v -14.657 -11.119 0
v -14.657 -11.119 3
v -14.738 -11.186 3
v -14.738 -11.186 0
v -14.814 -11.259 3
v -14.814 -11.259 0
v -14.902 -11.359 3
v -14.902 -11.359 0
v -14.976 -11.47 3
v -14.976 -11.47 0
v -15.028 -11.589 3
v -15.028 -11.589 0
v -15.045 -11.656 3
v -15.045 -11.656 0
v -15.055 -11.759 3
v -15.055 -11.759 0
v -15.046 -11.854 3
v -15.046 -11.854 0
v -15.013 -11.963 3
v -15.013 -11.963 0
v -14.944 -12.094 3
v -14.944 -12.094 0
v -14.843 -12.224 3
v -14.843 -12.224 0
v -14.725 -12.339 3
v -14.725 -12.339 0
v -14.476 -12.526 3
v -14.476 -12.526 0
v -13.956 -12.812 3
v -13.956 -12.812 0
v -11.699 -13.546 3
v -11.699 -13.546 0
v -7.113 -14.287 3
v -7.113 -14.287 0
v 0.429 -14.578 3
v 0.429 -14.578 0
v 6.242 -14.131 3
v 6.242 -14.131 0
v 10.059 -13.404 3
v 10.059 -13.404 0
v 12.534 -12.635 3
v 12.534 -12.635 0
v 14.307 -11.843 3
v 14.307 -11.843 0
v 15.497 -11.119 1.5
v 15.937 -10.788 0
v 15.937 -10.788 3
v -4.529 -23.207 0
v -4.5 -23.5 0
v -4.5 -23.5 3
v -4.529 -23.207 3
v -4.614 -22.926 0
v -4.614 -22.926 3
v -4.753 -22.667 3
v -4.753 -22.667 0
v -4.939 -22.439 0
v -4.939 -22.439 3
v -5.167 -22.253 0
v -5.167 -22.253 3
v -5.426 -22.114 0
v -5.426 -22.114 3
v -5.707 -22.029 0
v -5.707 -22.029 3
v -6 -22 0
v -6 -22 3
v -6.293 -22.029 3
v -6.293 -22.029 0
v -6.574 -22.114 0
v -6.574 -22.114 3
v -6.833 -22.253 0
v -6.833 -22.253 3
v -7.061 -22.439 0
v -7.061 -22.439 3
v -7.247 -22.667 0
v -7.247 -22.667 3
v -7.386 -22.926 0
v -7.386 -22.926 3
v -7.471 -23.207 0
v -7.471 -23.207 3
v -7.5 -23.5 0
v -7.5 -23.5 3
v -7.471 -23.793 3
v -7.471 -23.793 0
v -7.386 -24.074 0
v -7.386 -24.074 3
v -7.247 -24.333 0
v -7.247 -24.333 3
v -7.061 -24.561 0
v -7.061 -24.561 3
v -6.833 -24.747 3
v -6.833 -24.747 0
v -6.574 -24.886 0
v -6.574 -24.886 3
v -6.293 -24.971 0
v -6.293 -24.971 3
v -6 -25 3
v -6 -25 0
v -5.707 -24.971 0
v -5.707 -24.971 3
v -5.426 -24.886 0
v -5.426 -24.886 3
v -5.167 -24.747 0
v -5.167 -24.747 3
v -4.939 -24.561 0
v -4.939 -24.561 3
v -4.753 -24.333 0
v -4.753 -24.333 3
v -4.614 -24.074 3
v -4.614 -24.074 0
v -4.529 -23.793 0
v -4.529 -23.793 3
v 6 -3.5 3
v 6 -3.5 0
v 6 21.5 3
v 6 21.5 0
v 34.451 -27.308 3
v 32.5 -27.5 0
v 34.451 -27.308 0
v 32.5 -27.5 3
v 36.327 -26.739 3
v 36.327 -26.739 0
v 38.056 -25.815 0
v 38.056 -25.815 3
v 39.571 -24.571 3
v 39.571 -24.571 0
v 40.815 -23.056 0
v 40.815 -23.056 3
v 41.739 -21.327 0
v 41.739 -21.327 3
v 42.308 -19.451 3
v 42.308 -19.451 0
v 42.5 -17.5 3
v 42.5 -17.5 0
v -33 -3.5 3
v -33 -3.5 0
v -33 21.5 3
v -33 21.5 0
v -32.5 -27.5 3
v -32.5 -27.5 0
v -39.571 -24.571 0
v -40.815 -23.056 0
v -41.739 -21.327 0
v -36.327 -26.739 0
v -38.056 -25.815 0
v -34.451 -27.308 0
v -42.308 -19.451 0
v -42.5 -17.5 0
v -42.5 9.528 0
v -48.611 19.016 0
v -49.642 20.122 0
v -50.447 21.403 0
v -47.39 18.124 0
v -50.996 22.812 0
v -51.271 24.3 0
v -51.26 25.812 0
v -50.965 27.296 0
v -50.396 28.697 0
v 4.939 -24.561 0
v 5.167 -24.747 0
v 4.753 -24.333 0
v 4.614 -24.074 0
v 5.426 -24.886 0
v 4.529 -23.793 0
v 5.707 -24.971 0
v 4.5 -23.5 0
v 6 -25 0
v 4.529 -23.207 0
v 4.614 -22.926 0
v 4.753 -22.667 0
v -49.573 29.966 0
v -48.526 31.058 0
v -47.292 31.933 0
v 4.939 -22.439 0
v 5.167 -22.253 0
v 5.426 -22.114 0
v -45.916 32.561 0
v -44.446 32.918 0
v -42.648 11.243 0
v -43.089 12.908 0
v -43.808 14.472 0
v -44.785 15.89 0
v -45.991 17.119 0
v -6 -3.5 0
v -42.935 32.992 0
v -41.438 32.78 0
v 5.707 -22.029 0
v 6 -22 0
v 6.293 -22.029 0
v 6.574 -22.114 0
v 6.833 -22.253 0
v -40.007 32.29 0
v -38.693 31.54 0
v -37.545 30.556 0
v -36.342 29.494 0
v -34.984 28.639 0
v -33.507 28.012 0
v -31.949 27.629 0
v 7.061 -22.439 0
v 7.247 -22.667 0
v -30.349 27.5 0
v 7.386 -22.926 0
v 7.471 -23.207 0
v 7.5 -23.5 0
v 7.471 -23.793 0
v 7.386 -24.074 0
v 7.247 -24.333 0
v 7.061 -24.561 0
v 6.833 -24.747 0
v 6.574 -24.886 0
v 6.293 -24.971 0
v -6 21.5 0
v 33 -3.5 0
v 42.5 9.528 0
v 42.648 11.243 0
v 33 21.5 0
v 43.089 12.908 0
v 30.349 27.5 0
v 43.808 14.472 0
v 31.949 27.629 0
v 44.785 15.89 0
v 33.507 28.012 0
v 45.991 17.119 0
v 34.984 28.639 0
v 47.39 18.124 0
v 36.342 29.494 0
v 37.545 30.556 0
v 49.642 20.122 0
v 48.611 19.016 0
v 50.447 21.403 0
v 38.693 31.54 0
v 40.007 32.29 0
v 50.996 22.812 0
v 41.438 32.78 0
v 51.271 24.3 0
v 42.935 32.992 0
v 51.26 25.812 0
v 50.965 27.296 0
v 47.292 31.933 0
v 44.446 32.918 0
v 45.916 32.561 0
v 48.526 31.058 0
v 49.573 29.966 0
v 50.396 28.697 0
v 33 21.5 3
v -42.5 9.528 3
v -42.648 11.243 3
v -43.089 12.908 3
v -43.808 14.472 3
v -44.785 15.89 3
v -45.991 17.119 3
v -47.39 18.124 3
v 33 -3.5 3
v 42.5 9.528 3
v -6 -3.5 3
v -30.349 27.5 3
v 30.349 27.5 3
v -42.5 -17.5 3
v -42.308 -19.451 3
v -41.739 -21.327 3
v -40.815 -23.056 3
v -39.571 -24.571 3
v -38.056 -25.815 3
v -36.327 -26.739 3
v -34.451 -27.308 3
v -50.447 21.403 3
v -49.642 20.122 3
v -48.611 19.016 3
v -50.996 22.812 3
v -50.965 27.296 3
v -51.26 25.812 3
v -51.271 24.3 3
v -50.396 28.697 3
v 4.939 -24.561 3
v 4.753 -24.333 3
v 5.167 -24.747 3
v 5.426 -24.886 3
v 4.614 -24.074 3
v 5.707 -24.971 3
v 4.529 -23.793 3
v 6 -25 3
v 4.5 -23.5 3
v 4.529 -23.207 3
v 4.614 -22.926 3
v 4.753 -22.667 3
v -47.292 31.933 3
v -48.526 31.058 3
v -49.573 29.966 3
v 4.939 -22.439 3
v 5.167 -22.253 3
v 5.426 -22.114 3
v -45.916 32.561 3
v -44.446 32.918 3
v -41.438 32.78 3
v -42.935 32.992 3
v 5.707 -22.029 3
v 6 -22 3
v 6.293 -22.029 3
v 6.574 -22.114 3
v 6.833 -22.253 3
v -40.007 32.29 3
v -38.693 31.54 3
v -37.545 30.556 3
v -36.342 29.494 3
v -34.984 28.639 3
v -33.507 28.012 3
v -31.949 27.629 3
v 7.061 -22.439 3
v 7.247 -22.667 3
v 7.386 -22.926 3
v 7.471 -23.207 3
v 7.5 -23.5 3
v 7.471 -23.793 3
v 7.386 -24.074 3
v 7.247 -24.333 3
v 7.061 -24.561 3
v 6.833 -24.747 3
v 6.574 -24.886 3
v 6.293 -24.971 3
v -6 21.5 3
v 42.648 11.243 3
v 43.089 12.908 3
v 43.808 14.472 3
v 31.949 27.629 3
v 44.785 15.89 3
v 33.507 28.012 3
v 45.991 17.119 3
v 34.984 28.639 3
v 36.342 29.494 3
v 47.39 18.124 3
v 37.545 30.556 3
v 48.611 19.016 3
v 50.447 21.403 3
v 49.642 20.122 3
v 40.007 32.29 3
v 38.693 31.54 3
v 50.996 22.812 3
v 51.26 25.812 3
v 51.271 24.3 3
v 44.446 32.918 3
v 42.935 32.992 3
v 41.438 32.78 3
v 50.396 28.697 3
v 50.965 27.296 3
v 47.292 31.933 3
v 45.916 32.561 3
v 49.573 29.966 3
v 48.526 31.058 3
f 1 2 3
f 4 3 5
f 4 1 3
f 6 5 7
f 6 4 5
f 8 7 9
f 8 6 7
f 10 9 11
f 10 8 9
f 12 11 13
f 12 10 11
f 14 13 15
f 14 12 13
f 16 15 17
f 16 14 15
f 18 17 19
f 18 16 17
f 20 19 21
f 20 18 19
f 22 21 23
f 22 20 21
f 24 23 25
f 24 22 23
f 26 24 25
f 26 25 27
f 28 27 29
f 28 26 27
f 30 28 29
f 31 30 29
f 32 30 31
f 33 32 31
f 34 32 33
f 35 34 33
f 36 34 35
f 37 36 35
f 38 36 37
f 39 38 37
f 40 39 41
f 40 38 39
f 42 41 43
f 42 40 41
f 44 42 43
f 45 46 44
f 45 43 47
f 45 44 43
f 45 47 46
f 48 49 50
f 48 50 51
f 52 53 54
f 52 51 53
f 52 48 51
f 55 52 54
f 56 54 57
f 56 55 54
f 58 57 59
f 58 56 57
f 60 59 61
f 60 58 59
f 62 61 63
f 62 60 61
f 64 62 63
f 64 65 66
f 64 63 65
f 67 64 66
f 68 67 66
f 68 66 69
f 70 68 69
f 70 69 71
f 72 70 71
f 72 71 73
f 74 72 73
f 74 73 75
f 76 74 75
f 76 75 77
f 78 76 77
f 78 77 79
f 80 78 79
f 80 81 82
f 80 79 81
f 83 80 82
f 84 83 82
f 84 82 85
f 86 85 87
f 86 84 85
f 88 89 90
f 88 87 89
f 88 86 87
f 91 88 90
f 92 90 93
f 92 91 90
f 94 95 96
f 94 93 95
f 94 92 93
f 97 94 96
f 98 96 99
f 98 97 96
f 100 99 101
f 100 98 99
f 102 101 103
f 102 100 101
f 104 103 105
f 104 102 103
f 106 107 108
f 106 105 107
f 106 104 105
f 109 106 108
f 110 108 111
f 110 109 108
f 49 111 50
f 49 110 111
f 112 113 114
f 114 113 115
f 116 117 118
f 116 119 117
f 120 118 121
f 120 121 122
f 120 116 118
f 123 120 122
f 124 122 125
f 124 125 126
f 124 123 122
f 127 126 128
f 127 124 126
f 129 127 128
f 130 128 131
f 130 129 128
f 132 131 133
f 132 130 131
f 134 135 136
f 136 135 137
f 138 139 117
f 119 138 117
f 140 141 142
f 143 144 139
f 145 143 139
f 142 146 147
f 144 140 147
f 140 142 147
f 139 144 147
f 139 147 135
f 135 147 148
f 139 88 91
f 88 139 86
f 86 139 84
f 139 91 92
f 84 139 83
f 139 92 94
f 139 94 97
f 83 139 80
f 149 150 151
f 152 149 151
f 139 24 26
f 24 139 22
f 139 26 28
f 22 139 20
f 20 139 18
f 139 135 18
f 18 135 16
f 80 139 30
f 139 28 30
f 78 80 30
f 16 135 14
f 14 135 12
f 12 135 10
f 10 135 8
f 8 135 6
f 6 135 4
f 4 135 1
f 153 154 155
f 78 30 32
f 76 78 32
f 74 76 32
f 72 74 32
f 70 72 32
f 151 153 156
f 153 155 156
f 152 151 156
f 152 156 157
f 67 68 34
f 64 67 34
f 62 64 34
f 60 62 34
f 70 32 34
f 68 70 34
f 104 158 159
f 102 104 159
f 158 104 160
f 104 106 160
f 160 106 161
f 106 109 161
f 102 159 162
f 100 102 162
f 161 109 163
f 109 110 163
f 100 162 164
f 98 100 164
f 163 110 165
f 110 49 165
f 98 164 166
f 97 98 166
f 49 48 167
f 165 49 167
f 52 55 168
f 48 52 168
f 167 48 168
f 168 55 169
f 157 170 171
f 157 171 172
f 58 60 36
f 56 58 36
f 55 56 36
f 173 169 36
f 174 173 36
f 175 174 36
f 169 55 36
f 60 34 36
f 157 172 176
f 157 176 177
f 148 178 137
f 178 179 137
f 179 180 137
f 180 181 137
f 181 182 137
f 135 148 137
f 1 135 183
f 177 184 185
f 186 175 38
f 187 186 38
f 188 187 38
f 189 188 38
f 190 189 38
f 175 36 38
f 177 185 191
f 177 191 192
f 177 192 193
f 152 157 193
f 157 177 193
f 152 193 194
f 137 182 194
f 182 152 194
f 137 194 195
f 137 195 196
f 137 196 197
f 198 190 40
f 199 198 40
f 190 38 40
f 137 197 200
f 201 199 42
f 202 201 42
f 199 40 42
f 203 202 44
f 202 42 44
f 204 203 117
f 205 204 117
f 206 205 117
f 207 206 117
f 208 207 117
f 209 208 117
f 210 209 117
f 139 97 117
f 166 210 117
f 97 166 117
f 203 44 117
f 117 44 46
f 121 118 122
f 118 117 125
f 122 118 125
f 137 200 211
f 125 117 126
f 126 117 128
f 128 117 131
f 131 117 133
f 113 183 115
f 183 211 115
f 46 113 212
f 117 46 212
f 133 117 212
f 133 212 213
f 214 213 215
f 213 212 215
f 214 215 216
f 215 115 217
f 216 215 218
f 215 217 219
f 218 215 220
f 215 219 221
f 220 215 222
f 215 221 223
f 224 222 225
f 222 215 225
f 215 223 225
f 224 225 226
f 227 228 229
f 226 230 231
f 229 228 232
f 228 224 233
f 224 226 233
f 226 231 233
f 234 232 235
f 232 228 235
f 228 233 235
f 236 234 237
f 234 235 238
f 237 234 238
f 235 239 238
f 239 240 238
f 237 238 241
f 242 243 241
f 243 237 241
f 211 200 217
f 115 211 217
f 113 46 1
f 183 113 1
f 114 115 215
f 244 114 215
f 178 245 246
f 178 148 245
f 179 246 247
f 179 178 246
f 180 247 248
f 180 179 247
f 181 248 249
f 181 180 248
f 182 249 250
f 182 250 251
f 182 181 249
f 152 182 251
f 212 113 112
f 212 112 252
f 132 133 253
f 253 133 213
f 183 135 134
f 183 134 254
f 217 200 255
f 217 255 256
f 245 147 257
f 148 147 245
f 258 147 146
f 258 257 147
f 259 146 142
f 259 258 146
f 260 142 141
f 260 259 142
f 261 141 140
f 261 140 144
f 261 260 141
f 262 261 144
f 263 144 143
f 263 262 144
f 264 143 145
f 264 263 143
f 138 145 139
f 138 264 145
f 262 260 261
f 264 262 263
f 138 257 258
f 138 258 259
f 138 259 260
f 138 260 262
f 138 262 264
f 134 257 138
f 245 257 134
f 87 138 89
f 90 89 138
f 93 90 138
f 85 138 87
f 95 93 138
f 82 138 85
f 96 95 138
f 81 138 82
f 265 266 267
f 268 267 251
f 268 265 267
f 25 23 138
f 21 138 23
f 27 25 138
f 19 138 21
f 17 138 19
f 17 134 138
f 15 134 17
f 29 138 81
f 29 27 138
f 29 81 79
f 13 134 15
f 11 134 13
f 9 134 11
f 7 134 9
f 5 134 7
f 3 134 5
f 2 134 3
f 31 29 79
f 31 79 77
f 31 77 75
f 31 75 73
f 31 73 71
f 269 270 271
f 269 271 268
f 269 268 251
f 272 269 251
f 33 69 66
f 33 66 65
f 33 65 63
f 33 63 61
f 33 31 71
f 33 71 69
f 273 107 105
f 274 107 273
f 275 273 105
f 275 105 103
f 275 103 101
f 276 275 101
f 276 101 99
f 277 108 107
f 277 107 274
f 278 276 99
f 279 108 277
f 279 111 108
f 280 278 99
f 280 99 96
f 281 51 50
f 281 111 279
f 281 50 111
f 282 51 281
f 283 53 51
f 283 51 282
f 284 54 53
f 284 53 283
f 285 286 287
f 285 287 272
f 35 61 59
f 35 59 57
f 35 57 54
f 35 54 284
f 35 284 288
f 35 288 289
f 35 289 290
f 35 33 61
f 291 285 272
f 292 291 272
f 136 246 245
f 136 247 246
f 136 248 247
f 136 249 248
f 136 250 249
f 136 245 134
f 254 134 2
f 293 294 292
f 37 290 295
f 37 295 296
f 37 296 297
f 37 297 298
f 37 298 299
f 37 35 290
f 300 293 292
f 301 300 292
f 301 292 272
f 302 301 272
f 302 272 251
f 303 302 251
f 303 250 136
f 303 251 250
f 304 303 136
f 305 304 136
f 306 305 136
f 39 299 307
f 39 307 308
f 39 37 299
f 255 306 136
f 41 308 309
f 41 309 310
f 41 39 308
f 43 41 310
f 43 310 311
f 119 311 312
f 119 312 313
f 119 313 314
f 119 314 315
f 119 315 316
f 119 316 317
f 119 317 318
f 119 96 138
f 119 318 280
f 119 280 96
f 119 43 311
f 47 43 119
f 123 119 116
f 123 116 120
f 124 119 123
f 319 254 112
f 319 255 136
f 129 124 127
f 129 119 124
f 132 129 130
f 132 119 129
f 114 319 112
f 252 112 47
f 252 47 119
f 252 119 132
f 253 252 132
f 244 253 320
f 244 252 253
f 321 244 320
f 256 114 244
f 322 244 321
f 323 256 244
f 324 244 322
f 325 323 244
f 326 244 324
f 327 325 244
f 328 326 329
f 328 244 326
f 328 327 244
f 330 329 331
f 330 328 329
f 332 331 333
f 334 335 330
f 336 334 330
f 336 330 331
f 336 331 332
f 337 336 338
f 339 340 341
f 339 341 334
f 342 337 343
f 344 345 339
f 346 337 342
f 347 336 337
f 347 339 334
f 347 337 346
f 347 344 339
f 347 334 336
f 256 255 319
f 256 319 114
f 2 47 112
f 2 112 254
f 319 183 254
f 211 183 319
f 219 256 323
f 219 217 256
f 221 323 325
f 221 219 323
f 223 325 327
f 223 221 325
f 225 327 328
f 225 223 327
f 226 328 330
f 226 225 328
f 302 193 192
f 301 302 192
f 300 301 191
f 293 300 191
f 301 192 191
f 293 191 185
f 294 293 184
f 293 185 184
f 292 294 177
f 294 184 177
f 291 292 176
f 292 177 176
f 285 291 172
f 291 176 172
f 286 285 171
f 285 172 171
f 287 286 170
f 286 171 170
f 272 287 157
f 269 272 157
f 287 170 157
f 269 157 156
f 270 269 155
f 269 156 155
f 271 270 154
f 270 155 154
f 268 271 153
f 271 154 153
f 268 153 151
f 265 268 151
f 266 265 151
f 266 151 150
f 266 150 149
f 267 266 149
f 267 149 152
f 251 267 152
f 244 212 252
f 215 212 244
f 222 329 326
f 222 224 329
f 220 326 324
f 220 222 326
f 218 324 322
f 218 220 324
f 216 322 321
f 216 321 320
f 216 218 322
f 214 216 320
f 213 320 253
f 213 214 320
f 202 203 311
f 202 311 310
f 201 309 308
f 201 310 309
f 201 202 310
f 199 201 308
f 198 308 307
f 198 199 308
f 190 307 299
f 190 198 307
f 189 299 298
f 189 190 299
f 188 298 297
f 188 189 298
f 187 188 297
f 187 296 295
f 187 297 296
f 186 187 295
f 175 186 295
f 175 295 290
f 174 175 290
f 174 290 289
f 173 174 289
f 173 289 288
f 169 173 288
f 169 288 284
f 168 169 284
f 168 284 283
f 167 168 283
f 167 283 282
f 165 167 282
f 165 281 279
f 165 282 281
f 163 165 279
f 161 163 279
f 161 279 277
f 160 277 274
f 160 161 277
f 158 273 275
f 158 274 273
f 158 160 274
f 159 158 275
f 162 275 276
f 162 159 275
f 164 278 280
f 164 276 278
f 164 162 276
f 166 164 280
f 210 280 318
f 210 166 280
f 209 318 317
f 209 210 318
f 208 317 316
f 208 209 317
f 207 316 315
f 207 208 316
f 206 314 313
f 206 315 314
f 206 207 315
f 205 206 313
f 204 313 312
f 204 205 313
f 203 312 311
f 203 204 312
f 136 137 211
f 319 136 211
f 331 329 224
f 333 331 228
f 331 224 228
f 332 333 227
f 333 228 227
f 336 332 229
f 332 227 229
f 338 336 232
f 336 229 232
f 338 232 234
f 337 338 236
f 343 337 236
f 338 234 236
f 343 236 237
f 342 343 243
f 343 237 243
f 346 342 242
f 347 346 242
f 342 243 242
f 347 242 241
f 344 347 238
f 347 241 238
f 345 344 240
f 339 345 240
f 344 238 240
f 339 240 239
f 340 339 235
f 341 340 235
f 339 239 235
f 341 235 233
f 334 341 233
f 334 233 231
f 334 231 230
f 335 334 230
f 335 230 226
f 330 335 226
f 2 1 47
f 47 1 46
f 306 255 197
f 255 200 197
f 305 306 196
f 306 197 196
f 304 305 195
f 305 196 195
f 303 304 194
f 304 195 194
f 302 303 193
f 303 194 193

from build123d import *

# Parameters (mm, degrees)
SKETCH1_W               = 85
SKETCH1_H               = 55
BOSS_EXTRUDE2_DEPTH     = 3
CUT_EXTRUDE1_DEPTH      = 51.709959574
CUT_EXTRUDE1_DEPTH_BACK = 51.709959574
SKETCH3_W               = 27
SKETCH3_H               = 25
FILLET2_R               = 10
SKETCH4_R               = 8
BOSS_EXTRUDE3_DEPTH     = 3
FILLET3_R               = 10
CUT_EXTRUDE2_DEPTH      = 62.072254936
CUT_EXTRUDE2_DEPTH_BACK = 62.072254936
CUT_EXTRUDE3_DEPTH      = 62.072255079
CUT_EXTRUDE3_DEPTH_BACK = 62.072255079
SKETCH6_R               = 1.5


with BuildPart() as part:
    # Sketch1 → Boss-Extrude2 (new body)
    with BuildSketch(Plane.XY):
        Rectangle(SKETCH1_W, SKETCH1_H)
    extrude(amount=BOSS_EXTRUDE2_DEPTH)

    # Sketch3 → Cut-Extrude1 (cut, two sides: drawn at the far end of the back side and taken through both)
    with BuildSketch(Plane.XY.offset(3).offset(-CUT_EXTRUDE1_DEPTH_BACK)):
        with Locations((-19.5, 9)):
            Rectangle(SKETCH3_W, SKETCH3_H)
        with Locations((19.5, 9)):
            Rectangle(SKETCH3_W, SKETCH3_H)
    extrude(amount=CUT_EXTRUDE1_DEPTH + CUT_EXTRUDE1_DEPTH_BACK, mode=Mode.SUBTRACT)

    # Fillet2
    fillet2_edges = [part.edges().sort_by_distance(p)[0] for p in [
        (-42.5, -27.5, 1.5),
        (42.5, -27.5, 1.5),
    ]]
    fillet(fillet2_edges, radius=FILLET2_R)

    # Sketch4 → Boss-Extrude3 (add)
    with BuildSketch(Plane.XY):
        with Locations((-43.301270189, 25)):
            Circle(SKETCH4_R)
        with Locations((43.301270189, 25)):
            Circle(SKETCH4_R)
    extrude(amount=BOSS_EXTRUDE3_DEPTH)

    # Fillet3
    fillet3_edges = [part.edges().sort_by_distance(p)[0] for p in [
        (-35.701928112, 27.5, 1.5),
        (-42.5, 17.040228264, 1.5),
        (35.701928112, 27.5, 1.5),
        (42.5, 17.040228264, 1.5),
    ]]
    fillet(fillet3_edges, radius=FILLET3_R)

    # Sketch5 → Cut-Extrude2 (cut, two sides: drawn at the far end of the back side and taken through both)
    with BuildSketch(Plane.XY.offset(3).offset(-CUT_EXTRUDE2_DEPTH_BACK)):
        with BuildLine():
            Line((-14.657223741, -11.118605282), (15.937497294, -10.788446422))
            add(Edge.make_bspline(
                [(-14.657223741, -11.118605282), (-18.533826982, -14.187506868), (7.467986251, -17.149664061), (15.801657819, -10.897471716), (15.937497294, -10.788446422)],
                knots=[0, 0, 0, 0, 0.49190671, 0.50088311, 0.50088311, 0.50088311, 0.50088311], degree=3))
        make_face()
    extrude(amount=CUT_EXTRUDE2_DEPTH + CUT_EXTRUDE2_DEPTH_BACK, mode=Mode.SUBTRACT)

    # Sketch6 → Cut-Extrude3 (cut, two sides: drawn at the far end of the back side and taken through both)
    with BuildSketch(Plane.XY.offset(3).offset(-CUT_EXTRUDE3_DEPTH_BACK)):
        with Locations((-6, -23.5)):
            Circle(SKETCH6_R)
        with Locations((6, -23.5)):
            Circle(SKETCH6_R)
    extrude(amount=CUT_EXTRUDE3_DEPTH + CUT_EXTRUDE3_DEPTH_BACK, mode=Mode.SUBTRACT)


solid = part.part
